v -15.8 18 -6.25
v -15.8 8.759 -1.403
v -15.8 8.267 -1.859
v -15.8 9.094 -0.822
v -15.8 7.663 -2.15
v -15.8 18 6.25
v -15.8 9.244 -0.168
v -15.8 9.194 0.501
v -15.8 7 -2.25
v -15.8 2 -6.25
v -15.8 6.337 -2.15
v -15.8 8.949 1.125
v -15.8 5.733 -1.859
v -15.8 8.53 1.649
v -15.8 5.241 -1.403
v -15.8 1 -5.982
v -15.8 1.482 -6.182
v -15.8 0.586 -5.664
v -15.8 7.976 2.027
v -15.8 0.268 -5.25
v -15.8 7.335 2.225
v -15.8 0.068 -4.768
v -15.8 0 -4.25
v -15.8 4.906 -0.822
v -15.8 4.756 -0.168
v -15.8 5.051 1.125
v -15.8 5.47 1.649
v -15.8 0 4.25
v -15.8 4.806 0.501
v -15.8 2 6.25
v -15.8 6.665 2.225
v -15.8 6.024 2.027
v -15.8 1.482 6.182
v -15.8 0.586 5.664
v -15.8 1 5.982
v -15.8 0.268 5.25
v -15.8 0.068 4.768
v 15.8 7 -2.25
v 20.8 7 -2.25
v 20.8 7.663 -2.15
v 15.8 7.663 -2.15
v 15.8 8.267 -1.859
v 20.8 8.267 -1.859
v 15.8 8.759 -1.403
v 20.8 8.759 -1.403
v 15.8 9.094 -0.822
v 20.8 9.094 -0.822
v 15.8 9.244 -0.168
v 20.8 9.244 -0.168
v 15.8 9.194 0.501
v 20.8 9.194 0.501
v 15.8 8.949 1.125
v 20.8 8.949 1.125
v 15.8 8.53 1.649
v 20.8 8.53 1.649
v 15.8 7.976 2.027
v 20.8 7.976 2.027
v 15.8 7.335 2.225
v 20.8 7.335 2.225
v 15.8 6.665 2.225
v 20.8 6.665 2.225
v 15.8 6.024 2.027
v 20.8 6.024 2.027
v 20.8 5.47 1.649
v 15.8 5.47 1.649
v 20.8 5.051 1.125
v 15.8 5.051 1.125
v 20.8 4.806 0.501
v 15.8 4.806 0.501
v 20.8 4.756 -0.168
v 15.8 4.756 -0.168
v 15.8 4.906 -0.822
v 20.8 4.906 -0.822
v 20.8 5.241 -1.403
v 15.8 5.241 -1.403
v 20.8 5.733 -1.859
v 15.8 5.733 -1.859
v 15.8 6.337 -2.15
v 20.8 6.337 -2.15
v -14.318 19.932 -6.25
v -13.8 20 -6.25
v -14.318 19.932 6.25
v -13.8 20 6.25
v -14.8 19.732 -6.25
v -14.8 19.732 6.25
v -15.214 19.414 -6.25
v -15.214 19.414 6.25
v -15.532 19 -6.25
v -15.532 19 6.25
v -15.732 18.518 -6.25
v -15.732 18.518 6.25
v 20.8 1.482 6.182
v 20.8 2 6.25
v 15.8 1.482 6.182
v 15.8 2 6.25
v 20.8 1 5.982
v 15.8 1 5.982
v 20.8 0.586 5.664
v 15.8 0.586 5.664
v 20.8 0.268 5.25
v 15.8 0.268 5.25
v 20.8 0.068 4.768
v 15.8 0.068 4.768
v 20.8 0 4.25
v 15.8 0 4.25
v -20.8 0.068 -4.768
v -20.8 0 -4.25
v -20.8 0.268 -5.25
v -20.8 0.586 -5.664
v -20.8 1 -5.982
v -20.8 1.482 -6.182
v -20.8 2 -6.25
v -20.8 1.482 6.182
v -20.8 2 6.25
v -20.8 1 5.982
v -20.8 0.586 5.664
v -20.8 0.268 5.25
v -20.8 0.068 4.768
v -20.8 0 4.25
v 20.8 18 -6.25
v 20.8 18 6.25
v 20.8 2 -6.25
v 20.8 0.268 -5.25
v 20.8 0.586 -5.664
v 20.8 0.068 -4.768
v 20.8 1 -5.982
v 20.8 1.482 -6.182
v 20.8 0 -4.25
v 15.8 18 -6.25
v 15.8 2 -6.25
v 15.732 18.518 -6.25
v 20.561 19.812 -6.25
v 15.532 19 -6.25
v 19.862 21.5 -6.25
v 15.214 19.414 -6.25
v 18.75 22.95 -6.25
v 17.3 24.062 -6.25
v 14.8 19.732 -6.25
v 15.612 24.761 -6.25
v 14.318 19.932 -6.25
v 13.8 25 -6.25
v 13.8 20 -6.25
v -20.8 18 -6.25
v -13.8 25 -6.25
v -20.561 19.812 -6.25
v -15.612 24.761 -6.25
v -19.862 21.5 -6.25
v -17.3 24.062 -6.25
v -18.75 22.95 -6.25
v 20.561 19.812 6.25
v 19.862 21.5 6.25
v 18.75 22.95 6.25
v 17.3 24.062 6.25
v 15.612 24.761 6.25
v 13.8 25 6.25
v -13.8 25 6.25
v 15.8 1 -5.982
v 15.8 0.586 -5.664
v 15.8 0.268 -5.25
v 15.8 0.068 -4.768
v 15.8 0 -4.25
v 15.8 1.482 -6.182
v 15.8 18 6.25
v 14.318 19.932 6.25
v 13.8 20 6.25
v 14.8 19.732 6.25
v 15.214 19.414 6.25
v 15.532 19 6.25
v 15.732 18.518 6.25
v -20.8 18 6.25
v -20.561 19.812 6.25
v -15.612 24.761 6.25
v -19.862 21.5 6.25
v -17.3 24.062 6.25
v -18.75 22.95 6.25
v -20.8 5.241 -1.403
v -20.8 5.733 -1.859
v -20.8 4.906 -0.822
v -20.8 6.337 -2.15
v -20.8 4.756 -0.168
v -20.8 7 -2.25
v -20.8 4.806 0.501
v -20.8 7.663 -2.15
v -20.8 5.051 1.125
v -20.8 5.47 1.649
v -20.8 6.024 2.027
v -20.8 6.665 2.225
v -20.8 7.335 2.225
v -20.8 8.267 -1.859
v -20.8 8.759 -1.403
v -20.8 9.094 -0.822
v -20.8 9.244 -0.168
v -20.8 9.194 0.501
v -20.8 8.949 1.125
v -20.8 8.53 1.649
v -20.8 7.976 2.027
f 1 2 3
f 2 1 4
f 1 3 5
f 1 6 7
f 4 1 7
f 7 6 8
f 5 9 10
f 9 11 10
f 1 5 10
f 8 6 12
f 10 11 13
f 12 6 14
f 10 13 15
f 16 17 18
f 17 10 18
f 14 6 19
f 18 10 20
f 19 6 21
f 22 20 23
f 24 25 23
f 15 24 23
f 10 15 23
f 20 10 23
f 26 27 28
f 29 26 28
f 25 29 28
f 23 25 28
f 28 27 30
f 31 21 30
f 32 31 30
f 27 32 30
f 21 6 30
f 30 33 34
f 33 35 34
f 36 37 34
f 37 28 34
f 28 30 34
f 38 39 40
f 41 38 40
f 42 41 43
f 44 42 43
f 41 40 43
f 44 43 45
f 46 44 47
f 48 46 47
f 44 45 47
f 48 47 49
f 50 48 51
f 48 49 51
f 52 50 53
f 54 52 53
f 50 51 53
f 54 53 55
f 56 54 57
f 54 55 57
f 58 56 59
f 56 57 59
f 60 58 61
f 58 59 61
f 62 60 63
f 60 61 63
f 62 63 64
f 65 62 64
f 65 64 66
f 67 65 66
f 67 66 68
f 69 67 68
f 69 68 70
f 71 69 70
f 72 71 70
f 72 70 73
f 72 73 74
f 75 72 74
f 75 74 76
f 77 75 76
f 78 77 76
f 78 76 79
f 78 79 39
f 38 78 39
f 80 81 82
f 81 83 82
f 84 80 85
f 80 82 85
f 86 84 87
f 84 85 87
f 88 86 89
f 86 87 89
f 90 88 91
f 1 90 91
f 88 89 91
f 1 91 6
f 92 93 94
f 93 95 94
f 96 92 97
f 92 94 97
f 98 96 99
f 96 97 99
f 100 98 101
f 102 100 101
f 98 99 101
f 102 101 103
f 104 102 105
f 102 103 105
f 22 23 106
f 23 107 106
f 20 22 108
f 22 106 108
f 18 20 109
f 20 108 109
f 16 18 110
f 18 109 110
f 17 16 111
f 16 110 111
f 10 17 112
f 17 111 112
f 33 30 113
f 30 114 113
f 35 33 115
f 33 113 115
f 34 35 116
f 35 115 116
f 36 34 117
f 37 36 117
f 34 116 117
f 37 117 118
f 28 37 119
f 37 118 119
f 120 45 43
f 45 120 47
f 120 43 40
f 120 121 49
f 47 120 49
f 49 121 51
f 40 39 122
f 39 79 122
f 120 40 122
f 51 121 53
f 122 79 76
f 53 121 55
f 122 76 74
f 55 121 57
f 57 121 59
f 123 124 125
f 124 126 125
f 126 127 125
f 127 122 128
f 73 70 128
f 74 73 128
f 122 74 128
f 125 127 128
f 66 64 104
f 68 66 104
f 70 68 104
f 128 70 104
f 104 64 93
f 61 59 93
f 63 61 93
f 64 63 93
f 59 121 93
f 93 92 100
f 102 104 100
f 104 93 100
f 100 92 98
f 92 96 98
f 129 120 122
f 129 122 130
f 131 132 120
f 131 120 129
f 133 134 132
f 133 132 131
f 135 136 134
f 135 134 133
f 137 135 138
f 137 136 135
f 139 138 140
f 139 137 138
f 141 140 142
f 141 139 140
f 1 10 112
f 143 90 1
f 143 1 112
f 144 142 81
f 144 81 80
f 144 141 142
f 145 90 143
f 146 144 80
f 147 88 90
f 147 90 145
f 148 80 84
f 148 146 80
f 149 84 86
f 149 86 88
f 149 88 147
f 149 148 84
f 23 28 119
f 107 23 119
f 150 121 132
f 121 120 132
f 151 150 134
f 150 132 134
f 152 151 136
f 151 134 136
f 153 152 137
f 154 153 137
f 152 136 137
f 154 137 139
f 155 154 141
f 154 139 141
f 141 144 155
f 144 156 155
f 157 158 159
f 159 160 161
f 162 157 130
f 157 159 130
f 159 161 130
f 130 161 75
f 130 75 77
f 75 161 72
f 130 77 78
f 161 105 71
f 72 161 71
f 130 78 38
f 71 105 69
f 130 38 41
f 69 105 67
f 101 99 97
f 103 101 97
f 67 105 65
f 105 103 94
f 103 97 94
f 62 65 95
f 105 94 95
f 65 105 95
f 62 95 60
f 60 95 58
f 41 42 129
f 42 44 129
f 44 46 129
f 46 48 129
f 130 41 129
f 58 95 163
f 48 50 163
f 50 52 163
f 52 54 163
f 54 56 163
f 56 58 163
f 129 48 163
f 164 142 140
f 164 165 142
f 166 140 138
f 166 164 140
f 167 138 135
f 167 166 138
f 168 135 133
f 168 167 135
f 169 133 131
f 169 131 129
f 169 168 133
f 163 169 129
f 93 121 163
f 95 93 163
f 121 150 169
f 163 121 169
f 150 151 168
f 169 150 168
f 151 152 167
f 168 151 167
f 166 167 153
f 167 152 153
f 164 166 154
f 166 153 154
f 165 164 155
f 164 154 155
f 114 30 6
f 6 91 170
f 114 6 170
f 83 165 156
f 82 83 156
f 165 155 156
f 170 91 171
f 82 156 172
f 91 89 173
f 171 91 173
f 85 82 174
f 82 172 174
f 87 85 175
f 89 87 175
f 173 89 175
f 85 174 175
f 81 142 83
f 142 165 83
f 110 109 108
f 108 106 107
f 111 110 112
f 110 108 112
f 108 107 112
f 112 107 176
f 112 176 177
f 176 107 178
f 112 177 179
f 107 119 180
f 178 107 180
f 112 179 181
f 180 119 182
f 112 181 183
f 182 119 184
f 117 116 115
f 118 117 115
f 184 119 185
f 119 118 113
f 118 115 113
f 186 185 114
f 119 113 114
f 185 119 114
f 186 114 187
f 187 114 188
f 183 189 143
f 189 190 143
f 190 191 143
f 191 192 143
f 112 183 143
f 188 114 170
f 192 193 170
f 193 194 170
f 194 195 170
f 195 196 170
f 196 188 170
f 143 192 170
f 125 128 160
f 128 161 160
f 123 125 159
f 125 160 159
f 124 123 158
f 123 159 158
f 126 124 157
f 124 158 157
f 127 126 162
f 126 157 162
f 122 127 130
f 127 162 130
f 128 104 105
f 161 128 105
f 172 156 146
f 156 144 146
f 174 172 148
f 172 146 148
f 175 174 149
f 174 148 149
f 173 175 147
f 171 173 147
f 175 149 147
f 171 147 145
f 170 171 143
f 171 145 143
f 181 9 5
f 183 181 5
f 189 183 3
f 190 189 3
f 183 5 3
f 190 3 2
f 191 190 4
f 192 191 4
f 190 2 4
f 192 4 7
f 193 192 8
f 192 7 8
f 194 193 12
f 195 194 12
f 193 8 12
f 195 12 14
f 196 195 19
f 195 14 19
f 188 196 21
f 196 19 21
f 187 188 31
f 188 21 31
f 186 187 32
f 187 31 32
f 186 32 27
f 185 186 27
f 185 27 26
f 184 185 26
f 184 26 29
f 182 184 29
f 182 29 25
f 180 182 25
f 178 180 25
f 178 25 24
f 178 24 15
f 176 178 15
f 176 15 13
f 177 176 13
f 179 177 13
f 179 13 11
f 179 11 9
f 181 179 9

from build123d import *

# Parameters (mm, degrees)
BOSS_EXTRUDE1_DEPTH  = 6.25
FILLET1_R            = 2
FILLET2_R            = 7
FILLET3_R            = 2
M4_CLEARANCE_HOLE1_D = 4.5


with BuildPart() as part:
    # Sketch1 → Boss-Extrude1 (new body, symmetric)
    with BuildSketch(Plane.XY):
        Polygon((-15.8, 0), (-20.8, 0), (-20.8, 25), (20.8, 25), (20.8, 0), (15.8, 0), (15.8, 20), (-15.8, 20), align=None)
    extrude(amount=BOSS_EXTRUDE1_DEPTH, both=True)

    # Fillet1
    fillet1_edges = [part.edges().sort_by_distance(p)[0] for p in [
        (15.8, 20, 0),
        (-15.8, 20, 0),
    ]]
    fillet(fillet1_edges, radius=FILLET1_R)

    # Fillet2
    fillet2_edges = [part.edges().sort_by_distance(p)[0] for p in [
        (-20.8, 25, 0),
        (20.8, 25, 0),
    ]]
    fillet(fillet2_edges, radius=FILLET2_R)

    # Fillet3
    fillet3_edges = [part.edges().sort_by_distance(p)[0] for p in [
        (18.3, 0, -6.25),
        (18.3, 0, 6.25),
        (-18.3, 0, 6.25),
        (-18.3, 0, -6.25),
    ]]
    fillet(fillet3_edges, radius=FILLET3_R)

    # M4 Clearance Hole1 (through all)
    with Locations(Plane.ZY.offset(20.8)):
        with Locations((0, 7)):
            Hole(M4_CLEARANCE_HOLE1_D / 2)


solid = part.part
